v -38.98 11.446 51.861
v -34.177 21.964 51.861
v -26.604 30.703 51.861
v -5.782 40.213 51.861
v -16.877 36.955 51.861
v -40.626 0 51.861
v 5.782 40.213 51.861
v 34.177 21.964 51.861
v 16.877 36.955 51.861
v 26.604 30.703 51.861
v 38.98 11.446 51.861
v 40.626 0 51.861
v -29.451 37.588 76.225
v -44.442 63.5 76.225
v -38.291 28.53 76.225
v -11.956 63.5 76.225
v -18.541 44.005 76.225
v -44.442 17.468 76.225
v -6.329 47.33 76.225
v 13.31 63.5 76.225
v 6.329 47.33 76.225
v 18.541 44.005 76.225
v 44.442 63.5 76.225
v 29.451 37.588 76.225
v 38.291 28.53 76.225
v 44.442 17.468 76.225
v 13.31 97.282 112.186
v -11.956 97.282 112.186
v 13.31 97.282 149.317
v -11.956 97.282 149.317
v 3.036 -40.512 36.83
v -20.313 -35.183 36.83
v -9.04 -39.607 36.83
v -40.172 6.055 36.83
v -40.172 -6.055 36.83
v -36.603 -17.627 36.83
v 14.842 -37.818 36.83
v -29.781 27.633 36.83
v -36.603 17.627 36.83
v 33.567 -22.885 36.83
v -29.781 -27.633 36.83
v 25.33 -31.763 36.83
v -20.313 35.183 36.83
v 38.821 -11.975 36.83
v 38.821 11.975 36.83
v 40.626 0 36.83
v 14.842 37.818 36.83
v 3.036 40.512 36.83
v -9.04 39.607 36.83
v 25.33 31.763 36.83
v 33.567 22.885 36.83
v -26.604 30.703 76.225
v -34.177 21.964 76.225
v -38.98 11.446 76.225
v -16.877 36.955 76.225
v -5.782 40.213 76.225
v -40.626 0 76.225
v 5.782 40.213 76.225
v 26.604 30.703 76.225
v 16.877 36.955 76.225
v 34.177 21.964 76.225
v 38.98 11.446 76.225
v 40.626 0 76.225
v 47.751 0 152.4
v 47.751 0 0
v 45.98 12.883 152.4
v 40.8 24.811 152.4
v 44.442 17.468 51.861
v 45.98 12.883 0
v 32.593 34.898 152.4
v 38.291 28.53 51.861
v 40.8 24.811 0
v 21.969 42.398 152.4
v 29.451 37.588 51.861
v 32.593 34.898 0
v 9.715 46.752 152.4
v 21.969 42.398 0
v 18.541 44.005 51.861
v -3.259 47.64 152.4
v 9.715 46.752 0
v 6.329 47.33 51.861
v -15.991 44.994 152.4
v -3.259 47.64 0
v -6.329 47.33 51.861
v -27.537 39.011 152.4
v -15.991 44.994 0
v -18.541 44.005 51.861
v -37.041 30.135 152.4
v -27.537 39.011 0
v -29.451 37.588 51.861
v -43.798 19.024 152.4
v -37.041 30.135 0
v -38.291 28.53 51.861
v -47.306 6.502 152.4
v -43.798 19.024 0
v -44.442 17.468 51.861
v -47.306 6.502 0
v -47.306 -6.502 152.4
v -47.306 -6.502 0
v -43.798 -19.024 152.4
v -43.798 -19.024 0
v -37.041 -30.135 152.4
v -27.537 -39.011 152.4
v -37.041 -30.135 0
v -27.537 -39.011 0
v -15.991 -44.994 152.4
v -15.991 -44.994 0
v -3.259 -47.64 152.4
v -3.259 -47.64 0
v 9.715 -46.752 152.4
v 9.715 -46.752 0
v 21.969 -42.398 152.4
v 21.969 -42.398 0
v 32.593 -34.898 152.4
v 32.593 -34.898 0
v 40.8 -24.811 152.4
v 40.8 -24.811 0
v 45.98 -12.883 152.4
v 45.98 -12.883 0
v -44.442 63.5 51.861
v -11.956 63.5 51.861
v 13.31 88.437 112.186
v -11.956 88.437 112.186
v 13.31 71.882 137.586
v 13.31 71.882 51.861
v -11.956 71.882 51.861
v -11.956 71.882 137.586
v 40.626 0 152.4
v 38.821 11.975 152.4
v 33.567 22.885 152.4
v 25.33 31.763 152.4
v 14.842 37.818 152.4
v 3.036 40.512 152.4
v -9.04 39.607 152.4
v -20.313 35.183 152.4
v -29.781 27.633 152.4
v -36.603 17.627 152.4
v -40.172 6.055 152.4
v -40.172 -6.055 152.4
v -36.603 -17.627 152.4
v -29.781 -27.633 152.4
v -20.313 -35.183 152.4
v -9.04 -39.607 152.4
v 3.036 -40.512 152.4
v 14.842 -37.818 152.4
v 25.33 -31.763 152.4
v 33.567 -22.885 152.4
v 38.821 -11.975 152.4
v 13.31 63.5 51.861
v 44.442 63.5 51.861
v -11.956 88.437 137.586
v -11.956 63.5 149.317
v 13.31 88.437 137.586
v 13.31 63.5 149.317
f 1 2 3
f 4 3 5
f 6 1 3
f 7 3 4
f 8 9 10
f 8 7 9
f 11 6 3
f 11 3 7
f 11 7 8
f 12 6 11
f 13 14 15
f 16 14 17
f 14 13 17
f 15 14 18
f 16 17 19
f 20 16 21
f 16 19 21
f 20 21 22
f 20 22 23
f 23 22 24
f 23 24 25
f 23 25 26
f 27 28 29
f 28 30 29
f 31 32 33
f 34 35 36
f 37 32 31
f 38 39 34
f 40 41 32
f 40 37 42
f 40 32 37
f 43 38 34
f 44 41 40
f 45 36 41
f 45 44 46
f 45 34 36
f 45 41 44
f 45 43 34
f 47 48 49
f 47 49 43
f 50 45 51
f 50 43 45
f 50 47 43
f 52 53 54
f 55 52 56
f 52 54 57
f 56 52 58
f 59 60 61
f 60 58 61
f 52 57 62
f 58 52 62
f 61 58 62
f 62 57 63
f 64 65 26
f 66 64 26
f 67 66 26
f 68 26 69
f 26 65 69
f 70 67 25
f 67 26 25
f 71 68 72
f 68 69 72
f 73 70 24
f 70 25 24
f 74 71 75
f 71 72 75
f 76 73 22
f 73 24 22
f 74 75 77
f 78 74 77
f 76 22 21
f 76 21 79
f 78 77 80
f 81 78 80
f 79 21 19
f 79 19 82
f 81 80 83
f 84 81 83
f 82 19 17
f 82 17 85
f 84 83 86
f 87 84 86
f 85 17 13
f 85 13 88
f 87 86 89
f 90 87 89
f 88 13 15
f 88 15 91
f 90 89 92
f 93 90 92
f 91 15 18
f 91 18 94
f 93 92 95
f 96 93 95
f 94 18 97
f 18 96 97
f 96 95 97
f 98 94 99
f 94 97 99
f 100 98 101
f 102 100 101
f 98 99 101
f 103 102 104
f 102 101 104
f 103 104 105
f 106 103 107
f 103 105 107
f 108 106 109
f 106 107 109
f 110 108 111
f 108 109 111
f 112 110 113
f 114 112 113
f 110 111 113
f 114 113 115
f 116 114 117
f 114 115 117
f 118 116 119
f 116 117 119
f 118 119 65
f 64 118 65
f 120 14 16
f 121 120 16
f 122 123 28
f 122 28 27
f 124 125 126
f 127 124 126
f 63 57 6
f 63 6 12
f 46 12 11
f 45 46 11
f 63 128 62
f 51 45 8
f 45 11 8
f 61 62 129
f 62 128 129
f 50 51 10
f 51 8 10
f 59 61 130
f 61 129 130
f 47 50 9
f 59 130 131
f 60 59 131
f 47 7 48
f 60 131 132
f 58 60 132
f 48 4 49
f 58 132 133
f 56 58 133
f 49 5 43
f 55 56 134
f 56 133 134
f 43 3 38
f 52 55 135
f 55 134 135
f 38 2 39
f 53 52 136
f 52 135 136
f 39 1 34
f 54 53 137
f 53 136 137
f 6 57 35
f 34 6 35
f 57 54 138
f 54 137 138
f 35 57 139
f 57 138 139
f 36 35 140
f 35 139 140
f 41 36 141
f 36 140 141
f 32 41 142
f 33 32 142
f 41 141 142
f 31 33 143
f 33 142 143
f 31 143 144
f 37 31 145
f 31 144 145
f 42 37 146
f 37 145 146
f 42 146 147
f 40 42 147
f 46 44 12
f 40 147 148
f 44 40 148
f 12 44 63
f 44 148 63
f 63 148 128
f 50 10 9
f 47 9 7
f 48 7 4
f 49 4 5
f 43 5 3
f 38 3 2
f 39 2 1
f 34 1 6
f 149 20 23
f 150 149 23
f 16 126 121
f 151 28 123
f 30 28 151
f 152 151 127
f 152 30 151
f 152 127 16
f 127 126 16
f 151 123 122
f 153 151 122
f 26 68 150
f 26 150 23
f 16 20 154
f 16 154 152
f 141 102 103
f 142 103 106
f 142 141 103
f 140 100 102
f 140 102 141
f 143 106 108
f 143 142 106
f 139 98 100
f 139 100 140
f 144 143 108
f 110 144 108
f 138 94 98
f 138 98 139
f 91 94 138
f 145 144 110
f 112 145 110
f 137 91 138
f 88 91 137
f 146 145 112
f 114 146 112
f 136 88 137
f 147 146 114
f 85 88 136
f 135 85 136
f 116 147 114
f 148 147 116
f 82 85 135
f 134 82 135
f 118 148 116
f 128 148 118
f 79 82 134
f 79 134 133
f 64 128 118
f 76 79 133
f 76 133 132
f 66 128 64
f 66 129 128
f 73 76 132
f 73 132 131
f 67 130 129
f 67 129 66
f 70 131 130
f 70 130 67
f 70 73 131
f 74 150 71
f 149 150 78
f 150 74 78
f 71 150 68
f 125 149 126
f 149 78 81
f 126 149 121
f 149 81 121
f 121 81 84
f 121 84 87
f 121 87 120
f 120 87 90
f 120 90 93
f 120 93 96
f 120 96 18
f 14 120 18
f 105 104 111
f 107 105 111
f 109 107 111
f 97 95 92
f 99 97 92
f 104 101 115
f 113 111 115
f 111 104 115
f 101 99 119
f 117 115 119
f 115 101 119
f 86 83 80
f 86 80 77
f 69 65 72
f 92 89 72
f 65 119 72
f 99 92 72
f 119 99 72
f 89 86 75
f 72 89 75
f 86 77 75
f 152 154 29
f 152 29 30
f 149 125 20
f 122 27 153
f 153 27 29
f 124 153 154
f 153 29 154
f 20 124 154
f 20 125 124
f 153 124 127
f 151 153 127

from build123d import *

# Parameters (mm, degrees)
F0_R      = 47.751218
F1_DEPTH  = 152.4
F2_R      = 40.626072
F3_DEPTH  = 115.57
F4_W      = 88.883296
F4_H      = 24.363942
F5_DEPTH  = 63.5
F6_W      = 25.266318
F6_H      = 97.455788
F7_DEPTH  = 8.382
F8_W      = 25.266318
F8_H      = 11.73079
F9_DEPTH  = 25.4
F10_W     = 25.266318
F10_H     = 8.8453
F11_DEPTH = 25.4


with BuildPart() as f1:
    # F0 (on Top) → F1 (new body)
    with BuildSketch(Plane.XY):
        Circle(F0_R)
    extrude(amount=F1_DEPTH)

    # F2 (on face) → F3 (cut)
    with BuildSketch(Plane.XY.offset(152.4)):
        Circle(F2_R)
    extrude(amount=-F3_DEPTH, mode=Mode.SUBTRACT)

    # F4 (on Front) → F5 (join)
    with BuildSketch(Plane.XZ):
        with Locations((0, 64.04309)):
            Rectangle(F4_W, F4_H)
    extrude(amount=-F5_DEPTH)

    # F6 (on face) → F7 (join)
    with BuildSketch(Plane(origin=(0, 63.5, 0), x_dir=(-1, 0, 0), z_dir=(0, 1, 0))):
        with Locations((-0.676776, 100.589013)):
            Rectangle(F6_W, F6_H)
    extrude(amount=F7_DEPTH)

    # F8 (on face) → F9 (join)
    with BuildSketch(Plane(origin=(0, 71.882, 0), x_dir=(-1, 0, 0), z_dir=(0, 1, 0))):
        with Locations((-0.676776, 143.451512)):
            Rectangle(F8_W, F8_H)
    extrude(amount=F9_DEPTH)

    # F10 (on face) → F11 (join)
    with BuildSketch(Plane(origin=(0, 0, 137.586117), x_dir=(1, 0, 0), z_dir=(0, 0, -1))):
        with Locations((0.676776, -92.85935)):
            Rectangle(F10_W, F10_H)
    extrude(amount=F11_DEPTH)


solid = f1.part
